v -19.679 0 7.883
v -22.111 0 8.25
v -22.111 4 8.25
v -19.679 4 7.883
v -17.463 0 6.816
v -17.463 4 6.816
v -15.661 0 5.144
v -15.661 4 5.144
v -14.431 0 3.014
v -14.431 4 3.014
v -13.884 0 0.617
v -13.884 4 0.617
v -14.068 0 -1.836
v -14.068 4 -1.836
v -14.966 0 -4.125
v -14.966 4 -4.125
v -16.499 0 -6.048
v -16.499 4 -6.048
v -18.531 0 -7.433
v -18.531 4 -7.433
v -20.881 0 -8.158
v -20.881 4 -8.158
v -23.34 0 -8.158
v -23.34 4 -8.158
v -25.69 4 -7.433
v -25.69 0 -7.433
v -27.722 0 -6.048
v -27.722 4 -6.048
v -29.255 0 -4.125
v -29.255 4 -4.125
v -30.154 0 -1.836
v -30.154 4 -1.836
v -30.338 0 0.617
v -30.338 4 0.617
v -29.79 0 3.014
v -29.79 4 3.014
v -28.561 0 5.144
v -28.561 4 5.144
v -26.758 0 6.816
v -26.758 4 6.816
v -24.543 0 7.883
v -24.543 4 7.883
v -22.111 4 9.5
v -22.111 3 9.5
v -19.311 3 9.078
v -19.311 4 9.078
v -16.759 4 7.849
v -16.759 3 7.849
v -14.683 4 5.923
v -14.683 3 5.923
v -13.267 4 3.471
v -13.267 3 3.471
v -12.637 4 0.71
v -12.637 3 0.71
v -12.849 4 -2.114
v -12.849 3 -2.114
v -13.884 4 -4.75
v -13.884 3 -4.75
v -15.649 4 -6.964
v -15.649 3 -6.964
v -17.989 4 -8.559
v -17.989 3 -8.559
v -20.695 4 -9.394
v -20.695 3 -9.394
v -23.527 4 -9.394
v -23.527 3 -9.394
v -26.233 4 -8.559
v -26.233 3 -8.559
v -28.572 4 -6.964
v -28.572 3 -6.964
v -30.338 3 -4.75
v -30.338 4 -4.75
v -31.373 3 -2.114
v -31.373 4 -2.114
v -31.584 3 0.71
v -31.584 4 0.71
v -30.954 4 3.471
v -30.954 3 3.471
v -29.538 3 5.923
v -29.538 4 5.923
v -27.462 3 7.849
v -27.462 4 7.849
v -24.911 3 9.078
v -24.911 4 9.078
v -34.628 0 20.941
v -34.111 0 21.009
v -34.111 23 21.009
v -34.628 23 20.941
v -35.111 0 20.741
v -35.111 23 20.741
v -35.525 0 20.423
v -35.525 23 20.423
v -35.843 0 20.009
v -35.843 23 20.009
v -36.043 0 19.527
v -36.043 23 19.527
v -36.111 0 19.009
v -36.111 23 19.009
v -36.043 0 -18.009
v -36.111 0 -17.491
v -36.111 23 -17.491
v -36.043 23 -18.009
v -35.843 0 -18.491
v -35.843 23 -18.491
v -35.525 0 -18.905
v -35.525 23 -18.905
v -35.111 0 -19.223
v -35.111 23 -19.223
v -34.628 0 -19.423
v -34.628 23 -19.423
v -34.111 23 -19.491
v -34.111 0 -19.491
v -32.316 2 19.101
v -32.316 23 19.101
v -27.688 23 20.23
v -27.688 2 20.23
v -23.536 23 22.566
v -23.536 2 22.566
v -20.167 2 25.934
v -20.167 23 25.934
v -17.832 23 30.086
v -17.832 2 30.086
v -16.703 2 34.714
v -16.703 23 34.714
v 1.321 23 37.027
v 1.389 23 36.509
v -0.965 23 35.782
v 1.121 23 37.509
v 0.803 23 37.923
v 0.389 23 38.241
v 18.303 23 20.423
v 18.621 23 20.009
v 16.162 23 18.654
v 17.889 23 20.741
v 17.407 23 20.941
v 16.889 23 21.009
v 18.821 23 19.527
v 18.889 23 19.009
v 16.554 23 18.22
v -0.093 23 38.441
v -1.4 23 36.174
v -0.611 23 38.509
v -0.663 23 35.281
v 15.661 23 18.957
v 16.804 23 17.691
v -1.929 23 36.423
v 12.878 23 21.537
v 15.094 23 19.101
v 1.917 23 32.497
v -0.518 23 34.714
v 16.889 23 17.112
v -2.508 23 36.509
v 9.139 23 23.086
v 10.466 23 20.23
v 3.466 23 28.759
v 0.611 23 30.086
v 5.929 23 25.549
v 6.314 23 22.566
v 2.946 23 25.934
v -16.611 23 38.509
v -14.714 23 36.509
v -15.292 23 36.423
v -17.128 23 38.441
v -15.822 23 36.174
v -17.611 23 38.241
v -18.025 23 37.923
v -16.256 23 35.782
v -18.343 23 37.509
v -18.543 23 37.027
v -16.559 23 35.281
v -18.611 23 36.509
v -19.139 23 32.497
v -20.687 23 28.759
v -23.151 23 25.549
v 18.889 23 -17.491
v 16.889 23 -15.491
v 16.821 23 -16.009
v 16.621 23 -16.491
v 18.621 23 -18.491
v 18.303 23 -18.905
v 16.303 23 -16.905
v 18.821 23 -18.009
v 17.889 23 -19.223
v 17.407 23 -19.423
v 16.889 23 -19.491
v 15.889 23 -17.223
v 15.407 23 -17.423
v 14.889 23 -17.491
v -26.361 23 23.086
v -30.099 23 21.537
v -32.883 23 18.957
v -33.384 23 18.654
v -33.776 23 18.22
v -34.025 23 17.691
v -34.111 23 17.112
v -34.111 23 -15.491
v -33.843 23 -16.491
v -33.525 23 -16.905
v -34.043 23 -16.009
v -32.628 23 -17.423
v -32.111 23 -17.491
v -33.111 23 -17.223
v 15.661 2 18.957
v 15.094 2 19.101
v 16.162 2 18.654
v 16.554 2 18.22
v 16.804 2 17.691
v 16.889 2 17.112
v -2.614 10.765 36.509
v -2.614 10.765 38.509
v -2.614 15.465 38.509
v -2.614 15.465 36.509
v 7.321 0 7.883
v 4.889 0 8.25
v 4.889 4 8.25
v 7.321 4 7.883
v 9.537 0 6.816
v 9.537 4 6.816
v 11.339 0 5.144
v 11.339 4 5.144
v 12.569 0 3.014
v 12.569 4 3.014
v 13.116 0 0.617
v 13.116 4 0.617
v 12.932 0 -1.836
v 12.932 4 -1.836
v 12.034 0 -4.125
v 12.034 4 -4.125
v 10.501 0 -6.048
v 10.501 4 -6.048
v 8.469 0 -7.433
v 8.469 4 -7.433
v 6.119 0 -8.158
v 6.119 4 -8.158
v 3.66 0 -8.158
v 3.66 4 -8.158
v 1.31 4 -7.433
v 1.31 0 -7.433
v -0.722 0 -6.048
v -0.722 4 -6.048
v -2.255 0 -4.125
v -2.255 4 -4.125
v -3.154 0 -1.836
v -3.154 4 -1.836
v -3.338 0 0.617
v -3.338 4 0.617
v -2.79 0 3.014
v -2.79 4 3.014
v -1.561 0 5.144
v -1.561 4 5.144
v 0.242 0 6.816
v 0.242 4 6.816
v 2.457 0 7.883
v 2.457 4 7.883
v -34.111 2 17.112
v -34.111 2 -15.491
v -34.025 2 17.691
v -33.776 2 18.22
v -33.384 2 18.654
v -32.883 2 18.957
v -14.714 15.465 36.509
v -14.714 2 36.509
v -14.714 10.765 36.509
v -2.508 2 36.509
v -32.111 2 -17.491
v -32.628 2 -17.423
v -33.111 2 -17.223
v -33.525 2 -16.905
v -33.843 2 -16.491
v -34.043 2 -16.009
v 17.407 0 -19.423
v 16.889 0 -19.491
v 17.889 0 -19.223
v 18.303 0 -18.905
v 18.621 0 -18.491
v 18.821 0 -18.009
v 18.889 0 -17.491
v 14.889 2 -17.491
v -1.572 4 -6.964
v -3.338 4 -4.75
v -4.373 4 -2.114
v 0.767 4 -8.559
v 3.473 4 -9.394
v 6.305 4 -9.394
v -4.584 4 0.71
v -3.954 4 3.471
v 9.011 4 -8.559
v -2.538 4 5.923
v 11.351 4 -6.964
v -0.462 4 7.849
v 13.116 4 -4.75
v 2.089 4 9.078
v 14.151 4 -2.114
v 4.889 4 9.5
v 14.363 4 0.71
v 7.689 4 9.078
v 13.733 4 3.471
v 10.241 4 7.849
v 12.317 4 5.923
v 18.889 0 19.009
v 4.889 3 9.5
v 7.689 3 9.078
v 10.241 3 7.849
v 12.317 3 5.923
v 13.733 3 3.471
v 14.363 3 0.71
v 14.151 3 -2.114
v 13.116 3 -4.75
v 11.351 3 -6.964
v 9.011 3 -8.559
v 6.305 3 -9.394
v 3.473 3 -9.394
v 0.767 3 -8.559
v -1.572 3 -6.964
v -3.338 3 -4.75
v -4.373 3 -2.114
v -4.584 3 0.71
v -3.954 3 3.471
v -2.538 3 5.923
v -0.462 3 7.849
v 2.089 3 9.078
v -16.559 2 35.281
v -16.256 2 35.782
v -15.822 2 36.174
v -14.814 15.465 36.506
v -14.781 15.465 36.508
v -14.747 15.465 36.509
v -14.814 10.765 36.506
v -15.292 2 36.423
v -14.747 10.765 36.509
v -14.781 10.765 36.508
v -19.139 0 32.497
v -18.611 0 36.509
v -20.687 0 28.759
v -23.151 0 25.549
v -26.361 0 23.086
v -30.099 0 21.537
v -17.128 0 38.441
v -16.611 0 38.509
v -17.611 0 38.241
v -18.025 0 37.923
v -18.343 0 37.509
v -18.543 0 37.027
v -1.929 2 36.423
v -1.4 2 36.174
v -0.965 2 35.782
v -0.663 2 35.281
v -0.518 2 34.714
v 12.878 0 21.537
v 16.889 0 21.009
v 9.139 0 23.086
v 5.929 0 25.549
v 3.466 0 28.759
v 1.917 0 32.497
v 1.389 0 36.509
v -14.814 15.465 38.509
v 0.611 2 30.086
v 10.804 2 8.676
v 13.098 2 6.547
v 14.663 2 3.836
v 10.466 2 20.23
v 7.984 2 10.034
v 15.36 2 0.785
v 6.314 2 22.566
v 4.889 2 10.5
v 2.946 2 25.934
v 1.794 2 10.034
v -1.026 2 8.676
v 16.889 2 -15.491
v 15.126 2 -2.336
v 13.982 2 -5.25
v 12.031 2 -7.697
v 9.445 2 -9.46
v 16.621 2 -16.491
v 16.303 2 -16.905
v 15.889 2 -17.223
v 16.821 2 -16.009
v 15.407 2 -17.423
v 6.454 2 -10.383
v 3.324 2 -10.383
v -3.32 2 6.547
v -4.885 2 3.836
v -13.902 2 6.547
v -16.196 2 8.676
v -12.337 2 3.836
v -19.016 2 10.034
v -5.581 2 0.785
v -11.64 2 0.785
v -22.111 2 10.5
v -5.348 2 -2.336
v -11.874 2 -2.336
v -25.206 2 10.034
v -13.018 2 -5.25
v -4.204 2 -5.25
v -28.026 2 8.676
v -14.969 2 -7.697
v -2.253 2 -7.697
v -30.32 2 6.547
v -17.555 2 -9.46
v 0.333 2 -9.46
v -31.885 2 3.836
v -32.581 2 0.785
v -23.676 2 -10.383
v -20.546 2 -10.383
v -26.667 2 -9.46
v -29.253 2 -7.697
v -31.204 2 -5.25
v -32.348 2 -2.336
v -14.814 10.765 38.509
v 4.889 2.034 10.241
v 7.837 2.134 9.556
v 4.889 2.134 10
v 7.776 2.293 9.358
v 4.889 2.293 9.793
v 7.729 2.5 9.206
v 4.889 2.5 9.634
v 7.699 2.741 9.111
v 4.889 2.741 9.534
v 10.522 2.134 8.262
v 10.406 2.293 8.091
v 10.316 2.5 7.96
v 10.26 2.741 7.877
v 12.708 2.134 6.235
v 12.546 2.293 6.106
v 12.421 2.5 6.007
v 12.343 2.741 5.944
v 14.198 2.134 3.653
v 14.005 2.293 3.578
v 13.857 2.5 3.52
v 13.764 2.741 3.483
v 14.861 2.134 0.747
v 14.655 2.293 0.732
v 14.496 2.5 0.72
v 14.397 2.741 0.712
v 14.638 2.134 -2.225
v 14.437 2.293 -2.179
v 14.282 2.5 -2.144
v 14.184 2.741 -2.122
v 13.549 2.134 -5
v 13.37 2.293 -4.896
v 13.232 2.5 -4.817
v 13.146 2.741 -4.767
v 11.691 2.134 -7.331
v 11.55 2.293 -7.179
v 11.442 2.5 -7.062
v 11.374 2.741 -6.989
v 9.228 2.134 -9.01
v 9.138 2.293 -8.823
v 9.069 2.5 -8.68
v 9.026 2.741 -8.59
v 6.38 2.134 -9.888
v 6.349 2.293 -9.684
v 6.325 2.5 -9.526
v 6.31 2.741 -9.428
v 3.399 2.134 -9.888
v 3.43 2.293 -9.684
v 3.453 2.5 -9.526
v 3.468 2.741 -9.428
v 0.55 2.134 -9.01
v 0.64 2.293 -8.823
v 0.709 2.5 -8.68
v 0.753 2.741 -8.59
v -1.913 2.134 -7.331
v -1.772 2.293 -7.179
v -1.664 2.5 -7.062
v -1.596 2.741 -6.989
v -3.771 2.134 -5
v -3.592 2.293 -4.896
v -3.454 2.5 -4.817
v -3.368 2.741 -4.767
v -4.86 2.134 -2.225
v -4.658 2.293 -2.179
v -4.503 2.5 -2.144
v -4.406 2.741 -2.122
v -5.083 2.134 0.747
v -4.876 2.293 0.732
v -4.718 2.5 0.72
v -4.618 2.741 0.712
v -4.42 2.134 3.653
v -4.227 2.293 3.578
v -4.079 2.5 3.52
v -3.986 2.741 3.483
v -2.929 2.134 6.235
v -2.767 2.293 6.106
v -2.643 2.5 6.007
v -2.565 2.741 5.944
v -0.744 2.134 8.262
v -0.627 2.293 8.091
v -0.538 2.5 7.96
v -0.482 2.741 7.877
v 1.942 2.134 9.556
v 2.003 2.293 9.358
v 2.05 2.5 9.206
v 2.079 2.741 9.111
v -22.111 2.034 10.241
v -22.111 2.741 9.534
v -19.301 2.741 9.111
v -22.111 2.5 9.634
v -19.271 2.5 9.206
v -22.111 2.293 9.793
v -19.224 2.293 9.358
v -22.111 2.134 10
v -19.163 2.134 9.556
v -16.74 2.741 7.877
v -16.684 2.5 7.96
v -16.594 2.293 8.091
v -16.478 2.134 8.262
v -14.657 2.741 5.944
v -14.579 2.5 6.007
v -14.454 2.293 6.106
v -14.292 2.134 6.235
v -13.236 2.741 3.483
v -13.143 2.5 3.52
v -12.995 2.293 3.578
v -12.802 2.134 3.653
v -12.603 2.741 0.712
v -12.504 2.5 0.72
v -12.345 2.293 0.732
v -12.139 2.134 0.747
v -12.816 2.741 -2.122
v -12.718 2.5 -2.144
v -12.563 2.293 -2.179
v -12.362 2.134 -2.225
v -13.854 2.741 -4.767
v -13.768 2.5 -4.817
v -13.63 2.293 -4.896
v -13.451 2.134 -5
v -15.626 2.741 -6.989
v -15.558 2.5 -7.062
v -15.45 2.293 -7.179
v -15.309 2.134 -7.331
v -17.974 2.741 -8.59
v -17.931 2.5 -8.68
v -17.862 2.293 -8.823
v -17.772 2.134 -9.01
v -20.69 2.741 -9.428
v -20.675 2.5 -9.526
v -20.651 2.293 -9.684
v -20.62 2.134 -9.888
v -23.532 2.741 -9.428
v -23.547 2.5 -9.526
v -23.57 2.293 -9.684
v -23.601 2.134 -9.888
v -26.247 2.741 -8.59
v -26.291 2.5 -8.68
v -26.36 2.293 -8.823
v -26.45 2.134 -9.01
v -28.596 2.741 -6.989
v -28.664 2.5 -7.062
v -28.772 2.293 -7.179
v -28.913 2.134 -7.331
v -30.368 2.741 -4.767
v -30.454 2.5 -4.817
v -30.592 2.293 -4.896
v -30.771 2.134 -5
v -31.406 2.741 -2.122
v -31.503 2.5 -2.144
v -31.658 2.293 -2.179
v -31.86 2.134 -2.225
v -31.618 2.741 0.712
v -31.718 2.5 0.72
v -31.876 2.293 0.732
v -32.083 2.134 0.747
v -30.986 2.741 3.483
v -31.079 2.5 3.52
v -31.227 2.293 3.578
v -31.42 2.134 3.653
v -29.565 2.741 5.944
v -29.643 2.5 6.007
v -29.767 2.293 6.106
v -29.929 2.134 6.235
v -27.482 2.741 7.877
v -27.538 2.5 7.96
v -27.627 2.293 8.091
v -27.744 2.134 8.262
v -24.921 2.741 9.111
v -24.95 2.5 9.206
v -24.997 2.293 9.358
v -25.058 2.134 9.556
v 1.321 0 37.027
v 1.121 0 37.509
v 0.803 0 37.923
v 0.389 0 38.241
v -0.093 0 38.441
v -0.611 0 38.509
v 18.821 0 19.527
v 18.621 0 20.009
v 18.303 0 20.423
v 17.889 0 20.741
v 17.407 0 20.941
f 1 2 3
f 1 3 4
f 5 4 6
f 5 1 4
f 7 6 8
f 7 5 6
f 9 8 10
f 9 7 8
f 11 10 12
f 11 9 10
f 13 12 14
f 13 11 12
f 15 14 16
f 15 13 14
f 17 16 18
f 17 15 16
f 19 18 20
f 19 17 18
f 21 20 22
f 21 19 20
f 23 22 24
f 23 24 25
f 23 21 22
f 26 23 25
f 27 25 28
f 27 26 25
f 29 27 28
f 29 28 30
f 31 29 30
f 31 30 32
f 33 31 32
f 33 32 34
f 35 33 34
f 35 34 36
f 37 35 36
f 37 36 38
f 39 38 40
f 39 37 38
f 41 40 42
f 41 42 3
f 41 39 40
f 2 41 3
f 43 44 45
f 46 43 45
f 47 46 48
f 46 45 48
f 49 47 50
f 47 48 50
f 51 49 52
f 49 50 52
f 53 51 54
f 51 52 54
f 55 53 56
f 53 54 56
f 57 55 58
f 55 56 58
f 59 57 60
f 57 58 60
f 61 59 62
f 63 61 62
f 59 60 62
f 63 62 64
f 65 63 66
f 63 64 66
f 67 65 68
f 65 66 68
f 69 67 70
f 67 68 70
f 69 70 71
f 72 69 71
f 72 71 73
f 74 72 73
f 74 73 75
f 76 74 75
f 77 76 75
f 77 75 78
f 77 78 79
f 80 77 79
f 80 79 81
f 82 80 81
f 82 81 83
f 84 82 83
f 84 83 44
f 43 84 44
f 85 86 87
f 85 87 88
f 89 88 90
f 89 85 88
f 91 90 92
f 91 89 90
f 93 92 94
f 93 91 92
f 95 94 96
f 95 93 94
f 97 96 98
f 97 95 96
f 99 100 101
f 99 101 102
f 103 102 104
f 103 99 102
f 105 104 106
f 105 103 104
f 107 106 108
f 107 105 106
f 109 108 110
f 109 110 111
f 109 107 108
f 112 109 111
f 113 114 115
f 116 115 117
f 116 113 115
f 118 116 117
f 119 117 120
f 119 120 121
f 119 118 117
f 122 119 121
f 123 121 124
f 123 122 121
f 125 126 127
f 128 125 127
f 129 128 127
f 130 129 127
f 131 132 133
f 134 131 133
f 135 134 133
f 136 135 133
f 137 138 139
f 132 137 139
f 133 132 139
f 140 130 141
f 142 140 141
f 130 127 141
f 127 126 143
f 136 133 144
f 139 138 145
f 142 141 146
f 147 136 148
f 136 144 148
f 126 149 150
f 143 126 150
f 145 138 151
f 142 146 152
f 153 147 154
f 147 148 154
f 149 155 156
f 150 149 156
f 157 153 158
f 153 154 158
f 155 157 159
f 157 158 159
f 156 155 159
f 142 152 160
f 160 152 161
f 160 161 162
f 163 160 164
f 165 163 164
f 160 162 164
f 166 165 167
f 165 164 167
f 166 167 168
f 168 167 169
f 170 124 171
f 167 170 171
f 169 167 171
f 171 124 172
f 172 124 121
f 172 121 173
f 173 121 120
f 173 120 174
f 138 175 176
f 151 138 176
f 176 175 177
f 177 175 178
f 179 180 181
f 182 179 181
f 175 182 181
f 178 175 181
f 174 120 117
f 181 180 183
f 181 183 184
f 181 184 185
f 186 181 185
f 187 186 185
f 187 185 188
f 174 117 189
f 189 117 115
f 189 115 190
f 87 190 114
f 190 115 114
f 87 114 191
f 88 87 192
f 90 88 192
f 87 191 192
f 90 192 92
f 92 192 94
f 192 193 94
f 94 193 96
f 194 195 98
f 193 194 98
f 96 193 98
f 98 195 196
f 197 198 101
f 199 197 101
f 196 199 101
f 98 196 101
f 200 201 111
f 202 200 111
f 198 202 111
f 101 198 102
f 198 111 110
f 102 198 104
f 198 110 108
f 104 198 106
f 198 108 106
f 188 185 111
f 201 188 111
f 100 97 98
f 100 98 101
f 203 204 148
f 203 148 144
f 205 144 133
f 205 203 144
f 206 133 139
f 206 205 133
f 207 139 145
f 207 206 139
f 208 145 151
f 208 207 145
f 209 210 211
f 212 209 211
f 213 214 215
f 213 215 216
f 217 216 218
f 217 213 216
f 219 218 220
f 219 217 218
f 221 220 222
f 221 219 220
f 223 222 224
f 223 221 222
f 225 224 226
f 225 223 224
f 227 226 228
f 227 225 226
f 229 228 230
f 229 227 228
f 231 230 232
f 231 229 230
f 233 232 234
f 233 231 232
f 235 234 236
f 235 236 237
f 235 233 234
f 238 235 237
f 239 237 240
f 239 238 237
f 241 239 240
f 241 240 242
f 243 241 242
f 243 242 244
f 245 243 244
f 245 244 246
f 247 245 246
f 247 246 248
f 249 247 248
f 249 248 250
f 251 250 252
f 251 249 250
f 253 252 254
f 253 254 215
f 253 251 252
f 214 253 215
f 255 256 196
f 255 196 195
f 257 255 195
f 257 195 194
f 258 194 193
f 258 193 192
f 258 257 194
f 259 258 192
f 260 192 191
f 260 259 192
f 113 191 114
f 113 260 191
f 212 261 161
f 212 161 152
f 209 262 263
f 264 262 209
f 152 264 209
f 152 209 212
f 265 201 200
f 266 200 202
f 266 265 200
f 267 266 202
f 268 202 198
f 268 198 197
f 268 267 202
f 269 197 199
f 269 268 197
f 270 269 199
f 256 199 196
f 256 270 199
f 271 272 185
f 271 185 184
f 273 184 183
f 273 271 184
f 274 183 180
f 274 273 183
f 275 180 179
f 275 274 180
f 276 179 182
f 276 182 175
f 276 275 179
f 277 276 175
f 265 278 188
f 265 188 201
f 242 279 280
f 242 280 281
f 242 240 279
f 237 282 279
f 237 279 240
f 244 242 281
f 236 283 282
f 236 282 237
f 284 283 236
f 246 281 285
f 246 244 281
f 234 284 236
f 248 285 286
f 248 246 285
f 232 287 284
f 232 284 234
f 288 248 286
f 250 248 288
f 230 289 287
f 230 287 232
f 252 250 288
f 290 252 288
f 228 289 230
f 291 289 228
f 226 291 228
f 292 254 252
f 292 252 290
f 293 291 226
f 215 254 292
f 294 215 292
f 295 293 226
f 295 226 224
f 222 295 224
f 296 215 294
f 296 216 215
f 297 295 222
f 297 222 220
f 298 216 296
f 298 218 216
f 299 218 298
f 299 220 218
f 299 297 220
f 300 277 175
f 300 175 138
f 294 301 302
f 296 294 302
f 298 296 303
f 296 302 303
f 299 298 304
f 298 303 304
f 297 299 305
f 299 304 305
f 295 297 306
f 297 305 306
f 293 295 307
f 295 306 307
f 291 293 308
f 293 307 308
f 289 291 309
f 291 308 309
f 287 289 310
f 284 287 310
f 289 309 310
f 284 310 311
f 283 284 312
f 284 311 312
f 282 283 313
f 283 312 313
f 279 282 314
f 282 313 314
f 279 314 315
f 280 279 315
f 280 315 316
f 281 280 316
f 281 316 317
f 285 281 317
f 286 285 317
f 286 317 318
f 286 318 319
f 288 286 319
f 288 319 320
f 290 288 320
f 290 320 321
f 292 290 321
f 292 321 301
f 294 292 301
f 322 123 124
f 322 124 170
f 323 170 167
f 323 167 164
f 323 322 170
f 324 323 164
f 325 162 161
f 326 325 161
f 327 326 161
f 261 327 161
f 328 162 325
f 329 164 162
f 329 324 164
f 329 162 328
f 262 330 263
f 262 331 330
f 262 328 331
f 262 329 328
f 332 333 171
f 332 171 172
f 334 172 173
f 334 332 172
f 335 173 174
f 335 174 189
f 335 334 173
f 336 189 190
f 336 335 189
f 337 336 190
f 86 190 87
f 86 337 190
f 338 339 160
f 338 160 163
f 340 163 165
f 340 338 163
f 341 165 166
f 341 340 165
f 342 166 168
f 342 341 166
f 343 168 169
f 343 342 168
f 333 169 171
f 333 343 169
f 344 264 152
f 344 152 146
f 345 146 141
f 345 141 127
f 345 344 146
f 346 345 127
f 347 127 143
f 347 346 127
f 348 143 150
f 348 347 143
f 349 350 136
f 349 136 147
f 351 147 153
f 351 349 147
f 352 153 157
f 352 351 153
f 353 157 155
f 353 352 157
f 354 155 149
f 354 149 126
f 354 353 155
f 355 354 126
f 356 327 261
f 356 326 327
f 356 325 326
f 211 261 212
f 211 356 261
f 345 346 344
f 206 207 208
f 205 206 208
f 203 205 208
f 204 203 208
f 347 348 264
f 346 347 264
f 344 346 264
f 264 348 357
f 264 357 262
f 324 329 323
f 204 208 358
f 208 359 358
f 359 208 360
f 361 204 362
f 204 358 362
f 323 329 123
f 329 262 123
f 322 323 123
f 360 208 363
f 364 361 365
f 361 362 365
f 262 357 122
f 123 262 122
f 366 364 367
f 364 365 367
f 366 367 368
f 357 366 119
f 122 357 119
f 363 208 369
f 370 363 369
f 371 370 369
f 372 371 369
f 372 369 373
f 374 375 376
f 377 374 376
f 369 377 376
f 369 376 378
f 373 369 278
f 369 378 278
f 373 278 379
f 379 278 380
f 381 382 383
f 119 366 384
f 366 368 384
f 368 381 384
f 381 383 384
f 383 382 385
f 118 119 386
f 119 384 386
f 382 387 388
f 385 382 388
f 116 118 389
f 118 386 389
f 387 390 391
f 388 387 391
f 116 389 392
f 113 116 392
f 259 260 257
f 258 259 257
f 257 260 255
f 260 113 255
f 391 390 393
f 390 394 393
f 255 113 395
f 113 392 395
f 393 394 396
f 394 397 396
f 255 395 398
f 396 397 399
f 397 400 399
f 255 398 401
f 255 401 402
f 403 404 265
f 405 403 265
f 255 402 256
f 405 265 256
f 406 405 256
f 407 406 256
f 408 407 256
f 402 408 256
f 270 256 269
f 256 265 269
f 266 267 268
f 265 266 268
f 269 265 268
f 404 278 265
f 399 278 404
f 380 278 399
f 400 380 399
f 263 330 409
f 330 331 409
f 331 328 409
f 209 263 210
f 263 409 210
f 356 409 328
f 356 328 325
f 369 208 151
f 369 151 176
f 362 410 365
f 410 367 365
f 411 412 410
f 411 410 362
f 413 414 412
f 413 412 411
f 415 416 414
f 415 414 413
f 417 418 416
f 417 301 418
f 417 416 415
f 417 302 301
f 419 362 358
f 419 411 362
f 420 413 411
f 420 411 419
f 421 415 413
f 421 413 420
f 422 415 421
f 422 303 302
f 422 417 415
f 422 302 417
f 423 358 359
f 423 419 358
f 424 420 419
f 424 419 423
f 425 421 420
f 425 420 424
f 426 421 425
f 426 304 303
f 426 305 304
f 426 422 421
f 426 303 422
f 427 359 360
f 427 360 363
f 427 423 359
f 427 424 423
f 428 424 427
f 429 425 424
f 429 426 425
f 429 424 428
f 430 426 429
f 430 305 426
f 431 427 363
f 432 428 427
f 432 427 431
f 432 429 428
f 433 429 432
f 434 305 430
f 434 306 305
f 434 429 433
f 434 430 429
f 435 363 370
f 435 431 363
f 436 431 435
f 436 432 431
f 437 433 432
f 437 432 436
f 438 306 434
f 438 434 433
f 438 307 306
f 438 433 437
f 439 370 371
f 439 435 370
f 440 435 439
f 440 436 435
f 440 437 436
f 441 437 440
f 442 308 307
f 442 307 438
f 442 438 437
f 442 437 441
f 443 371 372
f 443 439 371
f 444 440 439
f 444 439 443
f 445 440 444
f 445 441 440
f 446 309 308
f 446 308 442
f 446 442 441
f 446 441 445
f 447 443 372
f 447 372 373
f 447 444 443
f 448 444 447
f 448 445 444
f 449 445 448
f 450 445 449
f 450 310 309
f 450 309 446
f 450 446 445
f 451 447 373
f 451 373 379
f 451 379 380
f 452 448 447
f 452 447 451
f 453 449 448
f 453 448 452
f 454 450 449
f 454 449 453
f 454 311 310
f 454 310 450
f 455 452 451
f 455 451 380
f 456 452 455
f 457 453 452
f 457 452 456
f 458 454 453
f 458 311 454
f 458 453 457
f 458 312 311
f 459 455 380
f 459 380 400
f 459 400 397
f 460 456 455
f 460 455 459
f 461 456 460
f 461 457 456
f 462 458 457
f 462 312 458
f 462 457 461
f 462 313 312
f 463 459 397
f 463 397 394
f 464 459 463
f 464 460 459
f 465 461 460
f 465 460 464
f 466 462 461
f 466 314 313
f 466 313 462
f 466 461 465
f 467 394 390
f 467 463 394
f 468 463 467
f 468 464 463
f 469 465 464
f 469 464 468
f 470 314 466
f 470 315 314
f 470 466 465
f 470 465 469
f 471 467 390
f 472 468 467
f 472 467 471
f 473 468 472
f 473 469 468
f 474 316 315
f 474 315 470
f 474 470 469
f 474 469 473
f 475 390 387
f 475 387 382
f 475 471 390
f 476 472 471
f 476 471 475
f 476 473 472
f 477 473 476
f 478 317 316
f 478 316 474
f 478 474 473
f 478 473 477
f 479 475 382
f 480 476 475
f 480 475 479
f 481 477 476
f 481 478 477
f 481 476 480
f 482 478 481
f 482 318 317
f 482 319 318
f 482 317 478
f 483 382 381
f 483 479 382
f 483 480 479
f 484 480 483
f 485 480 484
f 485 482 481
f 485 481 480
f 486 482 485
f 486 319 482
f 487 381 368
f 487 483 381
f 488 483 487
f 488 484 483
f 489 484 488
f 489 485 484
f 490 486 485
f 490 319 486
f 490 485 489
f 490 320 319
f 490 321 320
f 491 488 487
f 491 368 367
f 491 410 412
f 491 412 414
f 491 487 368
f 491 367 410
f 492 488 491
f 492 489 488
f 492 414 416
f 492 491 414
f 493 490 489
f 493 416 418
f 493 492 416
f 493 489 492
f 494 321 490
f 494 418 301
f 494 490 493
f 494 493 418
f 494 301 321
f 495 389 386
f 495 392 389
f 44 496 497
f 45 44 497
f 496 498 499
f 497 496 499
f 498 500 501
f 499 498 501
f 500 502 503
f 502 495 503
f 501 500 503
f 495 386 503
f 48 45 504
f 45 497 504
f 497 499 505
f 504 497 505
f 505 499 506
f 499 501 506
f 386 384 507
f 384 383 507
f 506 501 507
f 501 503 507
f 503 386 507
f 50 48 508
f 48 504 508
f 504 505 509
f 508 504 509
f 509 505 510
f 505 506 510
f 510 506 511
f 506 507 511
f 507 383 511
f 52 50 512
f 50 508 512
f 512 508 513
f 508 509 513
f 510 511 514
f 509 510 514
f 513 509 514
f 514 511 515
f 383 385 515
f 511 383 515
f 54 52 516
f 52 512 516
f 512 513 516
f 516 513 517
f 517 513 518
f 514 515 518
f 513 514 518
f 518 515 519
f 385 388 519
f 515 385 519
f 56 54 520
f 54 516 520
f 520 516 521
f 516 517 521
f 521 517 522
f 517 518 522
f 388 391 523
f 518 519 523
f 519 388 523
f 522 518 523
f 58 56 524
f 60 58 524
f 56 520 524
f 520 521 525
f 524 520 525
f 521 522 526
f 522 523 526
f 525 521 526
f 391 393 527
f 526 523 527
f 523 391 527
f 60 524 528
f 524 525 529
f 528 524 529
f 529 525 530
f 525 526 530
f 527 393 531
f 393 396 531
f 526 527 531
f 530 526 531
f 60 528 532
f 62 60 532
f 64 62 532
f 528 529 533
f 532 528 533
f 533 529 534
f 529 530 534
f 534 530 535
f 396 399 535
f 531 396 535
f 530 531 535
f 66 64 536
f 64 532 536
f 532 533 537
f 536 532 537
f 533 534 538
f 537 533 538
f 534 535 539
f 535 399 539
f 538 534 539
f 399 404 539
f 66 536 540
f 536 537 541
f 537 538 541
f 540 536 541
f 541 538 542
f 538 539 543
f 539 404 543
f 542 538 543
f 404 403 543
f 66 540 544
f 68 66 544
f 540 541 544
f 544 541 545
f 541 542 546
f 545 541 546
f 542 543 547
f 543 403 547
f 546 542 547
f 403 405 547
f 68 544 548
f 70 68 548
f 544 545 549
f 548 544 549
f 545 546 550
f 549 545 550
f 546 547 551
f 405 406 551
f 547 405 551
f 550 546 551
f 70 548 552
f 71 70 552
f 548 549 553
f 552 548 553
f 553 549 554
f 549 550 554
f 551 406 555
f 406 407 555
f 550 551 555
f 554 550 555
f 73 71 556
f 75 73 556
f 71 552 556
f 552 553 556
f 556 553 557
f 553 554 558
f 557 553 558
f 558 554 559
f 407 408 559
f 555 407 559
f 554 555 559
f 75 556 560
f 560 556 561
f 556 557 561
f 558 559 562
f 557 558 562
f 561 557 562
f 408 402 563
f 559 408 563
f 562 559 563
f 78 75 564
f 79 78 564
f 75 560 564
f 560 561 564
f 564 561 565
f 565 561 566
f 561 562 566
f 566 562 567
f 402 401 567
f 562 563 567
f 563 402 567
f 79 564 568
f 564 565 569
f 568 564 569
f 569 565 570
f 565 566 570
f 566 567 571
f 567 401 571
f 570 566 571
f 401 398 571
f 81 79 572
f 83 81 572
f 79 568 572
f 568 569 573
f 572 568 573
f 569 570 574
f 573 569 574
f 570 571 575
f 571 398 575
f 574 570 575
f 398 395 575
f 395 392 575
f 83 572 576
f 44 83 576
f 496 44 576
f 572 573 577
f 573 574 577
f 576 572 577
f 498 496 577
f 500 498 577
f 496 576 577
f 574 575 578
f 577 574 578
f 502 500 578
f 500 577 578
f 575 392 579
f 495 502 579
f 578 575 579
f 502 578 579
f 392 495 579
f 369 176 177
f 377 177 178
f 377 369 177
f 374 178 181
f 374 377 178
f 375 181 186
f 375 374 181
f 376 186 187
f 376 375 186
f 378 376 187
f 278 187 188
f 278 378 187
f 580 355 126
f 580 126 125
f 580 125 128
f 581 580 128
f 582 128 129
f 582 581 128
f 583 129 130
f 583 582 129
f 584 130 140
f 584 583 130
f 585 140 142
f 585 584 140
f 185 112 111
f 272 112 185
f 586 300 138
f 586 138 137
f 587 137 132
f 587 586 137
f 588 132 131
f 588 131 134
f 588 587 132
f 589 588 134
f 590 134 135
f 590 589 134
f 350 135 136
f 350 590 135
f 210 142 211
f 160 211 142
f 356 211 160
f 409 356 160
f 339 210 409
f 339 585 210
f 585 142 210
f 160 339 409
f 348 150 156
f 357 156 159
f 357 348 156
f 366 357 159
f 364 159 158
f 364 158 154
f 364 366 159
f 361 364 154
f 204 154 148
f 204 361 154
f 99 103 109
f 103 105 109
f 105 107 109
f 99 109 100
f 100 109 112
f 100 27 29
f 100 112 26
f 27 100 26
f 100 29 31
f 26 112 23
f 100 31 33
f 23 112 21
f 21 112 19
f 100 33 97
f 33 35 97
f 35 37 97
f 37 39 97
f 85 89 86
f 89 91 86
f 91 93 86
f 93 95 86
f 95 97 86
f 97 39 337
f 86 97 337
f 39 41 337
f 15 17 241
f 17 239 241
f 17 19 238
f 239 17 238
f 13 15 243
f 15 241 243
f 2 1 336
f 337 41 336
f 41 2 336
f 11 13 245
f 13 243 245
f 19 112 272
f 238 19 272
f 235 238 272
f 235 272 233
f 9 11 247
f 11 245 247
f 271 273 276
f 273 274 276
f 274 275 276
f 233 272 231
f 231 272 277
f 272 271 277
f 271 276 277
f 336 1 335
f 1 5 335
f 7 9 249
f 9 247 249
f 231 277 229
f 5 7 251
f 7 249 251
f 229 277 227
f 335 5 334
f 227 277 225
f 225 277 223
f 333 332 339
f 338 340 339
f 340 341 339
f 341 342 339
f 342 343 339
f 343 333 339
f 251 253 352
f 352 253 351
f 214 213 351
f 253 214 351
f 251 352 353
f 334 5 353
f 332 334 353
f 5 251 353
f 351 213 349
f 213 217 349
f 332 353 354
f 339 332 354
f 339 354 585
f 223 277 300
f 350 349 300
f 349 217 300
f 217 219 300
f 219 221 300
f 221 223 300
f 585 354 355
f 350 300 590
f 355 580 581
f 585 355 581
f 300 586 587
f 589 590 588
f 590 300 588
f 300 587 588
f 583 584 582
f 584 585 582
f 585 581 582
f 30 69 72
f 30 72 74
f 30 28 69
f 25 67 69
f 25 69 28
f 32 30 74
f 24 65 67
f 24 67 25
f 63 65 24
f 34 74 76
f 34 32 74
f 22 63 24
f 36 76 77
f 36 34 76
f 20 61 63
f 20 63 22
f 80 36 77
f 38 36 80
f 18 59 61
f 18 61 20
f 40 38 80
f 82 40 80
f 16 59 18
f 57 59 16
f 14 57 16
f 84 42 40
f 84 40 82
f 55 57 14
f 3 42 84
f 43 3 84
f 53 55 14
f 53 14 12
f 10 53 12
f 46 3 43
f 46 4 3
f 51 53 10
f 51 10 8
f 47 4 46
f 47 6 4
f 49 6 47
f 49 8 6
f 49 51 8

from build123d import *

# Parameters (mm, degrees)
SALIENTE_EXTRUIR1_DEPTH = 23
CROQUIS1_4_R            = 9.5
SALIENTE_EXTRUIR2_DEPTH = 2
CROQUIS1_6_R            = 9.5
CROQUIS1_6_R_2          = 8.25
SALIENTE_EXTRUIR3_DEPTH = 4
CROQUIS2_W              = 12.2
CROQUIS2_H              = 4.7
CORTAR_EXTRUIR4_DEPTH   = 4
REDONDEO1_R             = 1
REDONDEO2_R             = 1


with BuildPart() as part:
    # Croquis1 → Saliente-Extruir1 (new body)
    with BuildSketch(Plane(origin=(0, 0, 0), x_dir=(1, 0, 0), z_dir=(0, 1, 0))):
        with BuildLine():
            Line((16.889220689, 19.491025662), (-34.110779311, 19.491025662))
            ThreePointArc((-34.110779311, 19.491025662), (-35.524992874, 18.905239224), (-36.110779311, 17.491025662))
            Line((-36.110779311, 17.491025662), (-36.110779311, -19.008974338))
            ThreePointArc((-36.110779311, -19.008974338), (-35.524992874, -20.423187901), (-34.110779311, -21.008974338))
            ThreePointArc((-34.110779311, -21.008974338), (-23.150624203, -25.54881923), (-18.610779311, -36.508974338))
            ThreePointArc((-18.610779311, -36.508974338), (-18.024992874, -37.923187901), (-16.610779311, -38.508974338))
            Line((-16.610779311, -38.508974338), (-0.610779311, -38.508974338))
            ThreePointArc((-0.610779311, -38.508974338), (0.803434251, -37.923187901), (1.389220689, -36.508974338))
            ThreePointArc((1.389220689, -36.508974338), (5.92906558, -25.54881923), (16.889220689, -21.008974338))
            ThreePointArc((16.889220689, -21.008974338), (18.303434251, -20.423187901), (18.889220689, -19.008974338))
            Line((18.889220689, -19.008974338), (18.889220689, 17.491025662))
            ThreePointArc((18.889220689, 17.491025662), (18.303434251, 18.905239224), (16.889220689, 19.491025662))
        make_face()
        with BuildLine():
            ThreePointArc((-34.110779311, 15.491025662), (-33.524992874, 16.905239224), (-32.110779311, 17.491025662))
            Line((-32.110779311, 17.491025662), (14.889220689, 17.491025662))
            ThreePointArc((14.889220689, 17.491025662), (16.303434251, 16.905239224), (16.889220689, 15.491025662))
            Line((16.889220689, 15.491025662), (16.889220689, -17.111809597))
            ThreePointArc((16.889220689, -17.111809597), (16.374188097, -18.451537851), (15.094348894, -19.101262391))
            ThreePointArc((15.094348894, -19.101262391), (4.514852018, -24.134605668), (-0.518491259, -34.714102544))
            ThreePointArc((-0.518491259, -34.714102544), (-1.168215799, -35.993941747), (-2.507944053, -36.508974338))
            Line((-2.507944053, -36.508974338), (-14.71361457, -36.508974338))
            ThreePointArc((-14.71361457, -36.508974338), (-16.053342824, -35.993941747), (-16.703067364, -34.714102544))
            ThreePointArc((-16.703067364, -34.714102544), (-21.736410641, -24.134605668), (-32.315907517, -19.101262391))
            ThreePointArc((-32.315907517, -19.101262391), (-33.59574672, -18.451537851), (-34.110779311, -17.111809597))
            Line((-34.110779311, -17.111809597), (-34.110779311, 15.491025662))
        make_face(mode=Mode.SUBTRACT)
    extrude(amount=SALIENTE_EXTRUIR1_DEPTH)

    # Croquis1<4> → Saliente-Extruir2 (add)
    with BuildSketch(Plane(origin=(0, 0, 0), x_dir=(1, 0, 0), z_dir=(0, 1, 0))):
        with BuildLine():
            Line((14.889220689, 17.491025662), (-32.110779311, 17.491025662))
            ThreePointArc((-32.110779311, 17.491025662), (-33.524992874, 16.905239224), (-34.110779311, 15.491025662))
            Line((-34.110779311, 15.491025662), (-34.110779311, -17.111809597))
            ThreePointArc((-34.110779311, -17.111809597), (-33.59574672, -18.451537851), (-32.315907517, -19.101262391))
            ThreePointArc((-32.315907517, -19.101262391), (-21.736410641, -24.134605668), (-16.703067364, -34.714102544))
            ThreePointArc((-16.703067364, -34.714102544), (-16.053342824, -35.993941747), (-14.71361457, -36.508974338))
            Line((-14.71361457, -36.508974338), (-2.507944053, -36.508974338))
            ThreePointArc((-2.507944053, -36.508974338), (-1.168215799, -35.993941747), (-0.518491259, -34.714102544))
            ThreePointArc((-0.518491259, -34.714102544), (4.514852018, -24.134605668), (15.094348894, -19.101262391))
            ThreePointArc((15.094348894, -19.101262391), (16.374188097, -18.451537851), (16.889220689, -17.111809597))
            Line((16.889220689, -17.111809597), (16.889220689, 15.491025662))
            ThreePointArc((16.889220689, 15.491025662), (16.303434251, 16.905239224), (14.889220689, 17.491025662))
        make_face()
        with Locations((-22.110779311, 0)):
            Circle(CROQUIS1_4_R, mode=Mode.SUBTRACT)
        with Locations((4.889220689, 0)):
            Circle(CROQUIS1_4_R, mode=Mode.SUBTRACT)
    extrude(amount=SALIENTE_EXTRUIR2_DEPTH)

    # Croquis1<6> → Saliente-Extruir3 (add)
    # profile 1 of 2: a face of its own
    with BuildSketch(Plane(origin=(0, 0, 0), x_dir=(1, 0, 0), z_dir=(0, 1, 0))):
        with Locations((-22.110779311, 0)):
            Circle(CROQUIS1_6_R)
        with Locations((-22.110779311, 0)):
            Circle(CROQUIS1_6_R_2, mode=Mode.SUBTRACT)
    # profile 2 of 2: a face of its own
    with BuildSketch(Plane(origin=(0, 0, 0), x_dir=(1, 0, 0), z_dir=(0, 1, 0))):
        with Locations((4.889220689, 0)):
            Circle(CROQUIS1_6_R)
        with Locations((4.889220689, 0)):
            Circle(CROQUIS1_6_R_2, mode=Mode.SUBTRACT)
    extrude(amount=SALIENTE_EXTRUIR3_DEPTH)

    # Croquis2 → Cortar-Extruir4 (cut)
    with BuildSketch(Plane.XY.offset(38.508974338)):
        with Locations((-8.713971977, 13.114927271)):
            Rectangle(CROQUIS2_W, CROQUIS2_H)
    extrude(amount=-CORTAR_EXTRUIR4_DEPTH, mode=Mode.SUBTRACT)

    # Redondeo1
    redondeo1_edges = [part.edges().sort_by_distance(p)[0] for p in [
        (-31.610779311, 2, 0),
    ]]
    fillet(redondeo1_edges, radius=REDONDEO1_R)

    # Redondeo2
    redondeo2_edges = [part.edges().sort_by_distance(p)[0] for p in [
        (-4.610779311, 2, 0),
    ]]
    fillet(redondeo2_edges, radius=REDONDEO2_R)


solid = part.part
